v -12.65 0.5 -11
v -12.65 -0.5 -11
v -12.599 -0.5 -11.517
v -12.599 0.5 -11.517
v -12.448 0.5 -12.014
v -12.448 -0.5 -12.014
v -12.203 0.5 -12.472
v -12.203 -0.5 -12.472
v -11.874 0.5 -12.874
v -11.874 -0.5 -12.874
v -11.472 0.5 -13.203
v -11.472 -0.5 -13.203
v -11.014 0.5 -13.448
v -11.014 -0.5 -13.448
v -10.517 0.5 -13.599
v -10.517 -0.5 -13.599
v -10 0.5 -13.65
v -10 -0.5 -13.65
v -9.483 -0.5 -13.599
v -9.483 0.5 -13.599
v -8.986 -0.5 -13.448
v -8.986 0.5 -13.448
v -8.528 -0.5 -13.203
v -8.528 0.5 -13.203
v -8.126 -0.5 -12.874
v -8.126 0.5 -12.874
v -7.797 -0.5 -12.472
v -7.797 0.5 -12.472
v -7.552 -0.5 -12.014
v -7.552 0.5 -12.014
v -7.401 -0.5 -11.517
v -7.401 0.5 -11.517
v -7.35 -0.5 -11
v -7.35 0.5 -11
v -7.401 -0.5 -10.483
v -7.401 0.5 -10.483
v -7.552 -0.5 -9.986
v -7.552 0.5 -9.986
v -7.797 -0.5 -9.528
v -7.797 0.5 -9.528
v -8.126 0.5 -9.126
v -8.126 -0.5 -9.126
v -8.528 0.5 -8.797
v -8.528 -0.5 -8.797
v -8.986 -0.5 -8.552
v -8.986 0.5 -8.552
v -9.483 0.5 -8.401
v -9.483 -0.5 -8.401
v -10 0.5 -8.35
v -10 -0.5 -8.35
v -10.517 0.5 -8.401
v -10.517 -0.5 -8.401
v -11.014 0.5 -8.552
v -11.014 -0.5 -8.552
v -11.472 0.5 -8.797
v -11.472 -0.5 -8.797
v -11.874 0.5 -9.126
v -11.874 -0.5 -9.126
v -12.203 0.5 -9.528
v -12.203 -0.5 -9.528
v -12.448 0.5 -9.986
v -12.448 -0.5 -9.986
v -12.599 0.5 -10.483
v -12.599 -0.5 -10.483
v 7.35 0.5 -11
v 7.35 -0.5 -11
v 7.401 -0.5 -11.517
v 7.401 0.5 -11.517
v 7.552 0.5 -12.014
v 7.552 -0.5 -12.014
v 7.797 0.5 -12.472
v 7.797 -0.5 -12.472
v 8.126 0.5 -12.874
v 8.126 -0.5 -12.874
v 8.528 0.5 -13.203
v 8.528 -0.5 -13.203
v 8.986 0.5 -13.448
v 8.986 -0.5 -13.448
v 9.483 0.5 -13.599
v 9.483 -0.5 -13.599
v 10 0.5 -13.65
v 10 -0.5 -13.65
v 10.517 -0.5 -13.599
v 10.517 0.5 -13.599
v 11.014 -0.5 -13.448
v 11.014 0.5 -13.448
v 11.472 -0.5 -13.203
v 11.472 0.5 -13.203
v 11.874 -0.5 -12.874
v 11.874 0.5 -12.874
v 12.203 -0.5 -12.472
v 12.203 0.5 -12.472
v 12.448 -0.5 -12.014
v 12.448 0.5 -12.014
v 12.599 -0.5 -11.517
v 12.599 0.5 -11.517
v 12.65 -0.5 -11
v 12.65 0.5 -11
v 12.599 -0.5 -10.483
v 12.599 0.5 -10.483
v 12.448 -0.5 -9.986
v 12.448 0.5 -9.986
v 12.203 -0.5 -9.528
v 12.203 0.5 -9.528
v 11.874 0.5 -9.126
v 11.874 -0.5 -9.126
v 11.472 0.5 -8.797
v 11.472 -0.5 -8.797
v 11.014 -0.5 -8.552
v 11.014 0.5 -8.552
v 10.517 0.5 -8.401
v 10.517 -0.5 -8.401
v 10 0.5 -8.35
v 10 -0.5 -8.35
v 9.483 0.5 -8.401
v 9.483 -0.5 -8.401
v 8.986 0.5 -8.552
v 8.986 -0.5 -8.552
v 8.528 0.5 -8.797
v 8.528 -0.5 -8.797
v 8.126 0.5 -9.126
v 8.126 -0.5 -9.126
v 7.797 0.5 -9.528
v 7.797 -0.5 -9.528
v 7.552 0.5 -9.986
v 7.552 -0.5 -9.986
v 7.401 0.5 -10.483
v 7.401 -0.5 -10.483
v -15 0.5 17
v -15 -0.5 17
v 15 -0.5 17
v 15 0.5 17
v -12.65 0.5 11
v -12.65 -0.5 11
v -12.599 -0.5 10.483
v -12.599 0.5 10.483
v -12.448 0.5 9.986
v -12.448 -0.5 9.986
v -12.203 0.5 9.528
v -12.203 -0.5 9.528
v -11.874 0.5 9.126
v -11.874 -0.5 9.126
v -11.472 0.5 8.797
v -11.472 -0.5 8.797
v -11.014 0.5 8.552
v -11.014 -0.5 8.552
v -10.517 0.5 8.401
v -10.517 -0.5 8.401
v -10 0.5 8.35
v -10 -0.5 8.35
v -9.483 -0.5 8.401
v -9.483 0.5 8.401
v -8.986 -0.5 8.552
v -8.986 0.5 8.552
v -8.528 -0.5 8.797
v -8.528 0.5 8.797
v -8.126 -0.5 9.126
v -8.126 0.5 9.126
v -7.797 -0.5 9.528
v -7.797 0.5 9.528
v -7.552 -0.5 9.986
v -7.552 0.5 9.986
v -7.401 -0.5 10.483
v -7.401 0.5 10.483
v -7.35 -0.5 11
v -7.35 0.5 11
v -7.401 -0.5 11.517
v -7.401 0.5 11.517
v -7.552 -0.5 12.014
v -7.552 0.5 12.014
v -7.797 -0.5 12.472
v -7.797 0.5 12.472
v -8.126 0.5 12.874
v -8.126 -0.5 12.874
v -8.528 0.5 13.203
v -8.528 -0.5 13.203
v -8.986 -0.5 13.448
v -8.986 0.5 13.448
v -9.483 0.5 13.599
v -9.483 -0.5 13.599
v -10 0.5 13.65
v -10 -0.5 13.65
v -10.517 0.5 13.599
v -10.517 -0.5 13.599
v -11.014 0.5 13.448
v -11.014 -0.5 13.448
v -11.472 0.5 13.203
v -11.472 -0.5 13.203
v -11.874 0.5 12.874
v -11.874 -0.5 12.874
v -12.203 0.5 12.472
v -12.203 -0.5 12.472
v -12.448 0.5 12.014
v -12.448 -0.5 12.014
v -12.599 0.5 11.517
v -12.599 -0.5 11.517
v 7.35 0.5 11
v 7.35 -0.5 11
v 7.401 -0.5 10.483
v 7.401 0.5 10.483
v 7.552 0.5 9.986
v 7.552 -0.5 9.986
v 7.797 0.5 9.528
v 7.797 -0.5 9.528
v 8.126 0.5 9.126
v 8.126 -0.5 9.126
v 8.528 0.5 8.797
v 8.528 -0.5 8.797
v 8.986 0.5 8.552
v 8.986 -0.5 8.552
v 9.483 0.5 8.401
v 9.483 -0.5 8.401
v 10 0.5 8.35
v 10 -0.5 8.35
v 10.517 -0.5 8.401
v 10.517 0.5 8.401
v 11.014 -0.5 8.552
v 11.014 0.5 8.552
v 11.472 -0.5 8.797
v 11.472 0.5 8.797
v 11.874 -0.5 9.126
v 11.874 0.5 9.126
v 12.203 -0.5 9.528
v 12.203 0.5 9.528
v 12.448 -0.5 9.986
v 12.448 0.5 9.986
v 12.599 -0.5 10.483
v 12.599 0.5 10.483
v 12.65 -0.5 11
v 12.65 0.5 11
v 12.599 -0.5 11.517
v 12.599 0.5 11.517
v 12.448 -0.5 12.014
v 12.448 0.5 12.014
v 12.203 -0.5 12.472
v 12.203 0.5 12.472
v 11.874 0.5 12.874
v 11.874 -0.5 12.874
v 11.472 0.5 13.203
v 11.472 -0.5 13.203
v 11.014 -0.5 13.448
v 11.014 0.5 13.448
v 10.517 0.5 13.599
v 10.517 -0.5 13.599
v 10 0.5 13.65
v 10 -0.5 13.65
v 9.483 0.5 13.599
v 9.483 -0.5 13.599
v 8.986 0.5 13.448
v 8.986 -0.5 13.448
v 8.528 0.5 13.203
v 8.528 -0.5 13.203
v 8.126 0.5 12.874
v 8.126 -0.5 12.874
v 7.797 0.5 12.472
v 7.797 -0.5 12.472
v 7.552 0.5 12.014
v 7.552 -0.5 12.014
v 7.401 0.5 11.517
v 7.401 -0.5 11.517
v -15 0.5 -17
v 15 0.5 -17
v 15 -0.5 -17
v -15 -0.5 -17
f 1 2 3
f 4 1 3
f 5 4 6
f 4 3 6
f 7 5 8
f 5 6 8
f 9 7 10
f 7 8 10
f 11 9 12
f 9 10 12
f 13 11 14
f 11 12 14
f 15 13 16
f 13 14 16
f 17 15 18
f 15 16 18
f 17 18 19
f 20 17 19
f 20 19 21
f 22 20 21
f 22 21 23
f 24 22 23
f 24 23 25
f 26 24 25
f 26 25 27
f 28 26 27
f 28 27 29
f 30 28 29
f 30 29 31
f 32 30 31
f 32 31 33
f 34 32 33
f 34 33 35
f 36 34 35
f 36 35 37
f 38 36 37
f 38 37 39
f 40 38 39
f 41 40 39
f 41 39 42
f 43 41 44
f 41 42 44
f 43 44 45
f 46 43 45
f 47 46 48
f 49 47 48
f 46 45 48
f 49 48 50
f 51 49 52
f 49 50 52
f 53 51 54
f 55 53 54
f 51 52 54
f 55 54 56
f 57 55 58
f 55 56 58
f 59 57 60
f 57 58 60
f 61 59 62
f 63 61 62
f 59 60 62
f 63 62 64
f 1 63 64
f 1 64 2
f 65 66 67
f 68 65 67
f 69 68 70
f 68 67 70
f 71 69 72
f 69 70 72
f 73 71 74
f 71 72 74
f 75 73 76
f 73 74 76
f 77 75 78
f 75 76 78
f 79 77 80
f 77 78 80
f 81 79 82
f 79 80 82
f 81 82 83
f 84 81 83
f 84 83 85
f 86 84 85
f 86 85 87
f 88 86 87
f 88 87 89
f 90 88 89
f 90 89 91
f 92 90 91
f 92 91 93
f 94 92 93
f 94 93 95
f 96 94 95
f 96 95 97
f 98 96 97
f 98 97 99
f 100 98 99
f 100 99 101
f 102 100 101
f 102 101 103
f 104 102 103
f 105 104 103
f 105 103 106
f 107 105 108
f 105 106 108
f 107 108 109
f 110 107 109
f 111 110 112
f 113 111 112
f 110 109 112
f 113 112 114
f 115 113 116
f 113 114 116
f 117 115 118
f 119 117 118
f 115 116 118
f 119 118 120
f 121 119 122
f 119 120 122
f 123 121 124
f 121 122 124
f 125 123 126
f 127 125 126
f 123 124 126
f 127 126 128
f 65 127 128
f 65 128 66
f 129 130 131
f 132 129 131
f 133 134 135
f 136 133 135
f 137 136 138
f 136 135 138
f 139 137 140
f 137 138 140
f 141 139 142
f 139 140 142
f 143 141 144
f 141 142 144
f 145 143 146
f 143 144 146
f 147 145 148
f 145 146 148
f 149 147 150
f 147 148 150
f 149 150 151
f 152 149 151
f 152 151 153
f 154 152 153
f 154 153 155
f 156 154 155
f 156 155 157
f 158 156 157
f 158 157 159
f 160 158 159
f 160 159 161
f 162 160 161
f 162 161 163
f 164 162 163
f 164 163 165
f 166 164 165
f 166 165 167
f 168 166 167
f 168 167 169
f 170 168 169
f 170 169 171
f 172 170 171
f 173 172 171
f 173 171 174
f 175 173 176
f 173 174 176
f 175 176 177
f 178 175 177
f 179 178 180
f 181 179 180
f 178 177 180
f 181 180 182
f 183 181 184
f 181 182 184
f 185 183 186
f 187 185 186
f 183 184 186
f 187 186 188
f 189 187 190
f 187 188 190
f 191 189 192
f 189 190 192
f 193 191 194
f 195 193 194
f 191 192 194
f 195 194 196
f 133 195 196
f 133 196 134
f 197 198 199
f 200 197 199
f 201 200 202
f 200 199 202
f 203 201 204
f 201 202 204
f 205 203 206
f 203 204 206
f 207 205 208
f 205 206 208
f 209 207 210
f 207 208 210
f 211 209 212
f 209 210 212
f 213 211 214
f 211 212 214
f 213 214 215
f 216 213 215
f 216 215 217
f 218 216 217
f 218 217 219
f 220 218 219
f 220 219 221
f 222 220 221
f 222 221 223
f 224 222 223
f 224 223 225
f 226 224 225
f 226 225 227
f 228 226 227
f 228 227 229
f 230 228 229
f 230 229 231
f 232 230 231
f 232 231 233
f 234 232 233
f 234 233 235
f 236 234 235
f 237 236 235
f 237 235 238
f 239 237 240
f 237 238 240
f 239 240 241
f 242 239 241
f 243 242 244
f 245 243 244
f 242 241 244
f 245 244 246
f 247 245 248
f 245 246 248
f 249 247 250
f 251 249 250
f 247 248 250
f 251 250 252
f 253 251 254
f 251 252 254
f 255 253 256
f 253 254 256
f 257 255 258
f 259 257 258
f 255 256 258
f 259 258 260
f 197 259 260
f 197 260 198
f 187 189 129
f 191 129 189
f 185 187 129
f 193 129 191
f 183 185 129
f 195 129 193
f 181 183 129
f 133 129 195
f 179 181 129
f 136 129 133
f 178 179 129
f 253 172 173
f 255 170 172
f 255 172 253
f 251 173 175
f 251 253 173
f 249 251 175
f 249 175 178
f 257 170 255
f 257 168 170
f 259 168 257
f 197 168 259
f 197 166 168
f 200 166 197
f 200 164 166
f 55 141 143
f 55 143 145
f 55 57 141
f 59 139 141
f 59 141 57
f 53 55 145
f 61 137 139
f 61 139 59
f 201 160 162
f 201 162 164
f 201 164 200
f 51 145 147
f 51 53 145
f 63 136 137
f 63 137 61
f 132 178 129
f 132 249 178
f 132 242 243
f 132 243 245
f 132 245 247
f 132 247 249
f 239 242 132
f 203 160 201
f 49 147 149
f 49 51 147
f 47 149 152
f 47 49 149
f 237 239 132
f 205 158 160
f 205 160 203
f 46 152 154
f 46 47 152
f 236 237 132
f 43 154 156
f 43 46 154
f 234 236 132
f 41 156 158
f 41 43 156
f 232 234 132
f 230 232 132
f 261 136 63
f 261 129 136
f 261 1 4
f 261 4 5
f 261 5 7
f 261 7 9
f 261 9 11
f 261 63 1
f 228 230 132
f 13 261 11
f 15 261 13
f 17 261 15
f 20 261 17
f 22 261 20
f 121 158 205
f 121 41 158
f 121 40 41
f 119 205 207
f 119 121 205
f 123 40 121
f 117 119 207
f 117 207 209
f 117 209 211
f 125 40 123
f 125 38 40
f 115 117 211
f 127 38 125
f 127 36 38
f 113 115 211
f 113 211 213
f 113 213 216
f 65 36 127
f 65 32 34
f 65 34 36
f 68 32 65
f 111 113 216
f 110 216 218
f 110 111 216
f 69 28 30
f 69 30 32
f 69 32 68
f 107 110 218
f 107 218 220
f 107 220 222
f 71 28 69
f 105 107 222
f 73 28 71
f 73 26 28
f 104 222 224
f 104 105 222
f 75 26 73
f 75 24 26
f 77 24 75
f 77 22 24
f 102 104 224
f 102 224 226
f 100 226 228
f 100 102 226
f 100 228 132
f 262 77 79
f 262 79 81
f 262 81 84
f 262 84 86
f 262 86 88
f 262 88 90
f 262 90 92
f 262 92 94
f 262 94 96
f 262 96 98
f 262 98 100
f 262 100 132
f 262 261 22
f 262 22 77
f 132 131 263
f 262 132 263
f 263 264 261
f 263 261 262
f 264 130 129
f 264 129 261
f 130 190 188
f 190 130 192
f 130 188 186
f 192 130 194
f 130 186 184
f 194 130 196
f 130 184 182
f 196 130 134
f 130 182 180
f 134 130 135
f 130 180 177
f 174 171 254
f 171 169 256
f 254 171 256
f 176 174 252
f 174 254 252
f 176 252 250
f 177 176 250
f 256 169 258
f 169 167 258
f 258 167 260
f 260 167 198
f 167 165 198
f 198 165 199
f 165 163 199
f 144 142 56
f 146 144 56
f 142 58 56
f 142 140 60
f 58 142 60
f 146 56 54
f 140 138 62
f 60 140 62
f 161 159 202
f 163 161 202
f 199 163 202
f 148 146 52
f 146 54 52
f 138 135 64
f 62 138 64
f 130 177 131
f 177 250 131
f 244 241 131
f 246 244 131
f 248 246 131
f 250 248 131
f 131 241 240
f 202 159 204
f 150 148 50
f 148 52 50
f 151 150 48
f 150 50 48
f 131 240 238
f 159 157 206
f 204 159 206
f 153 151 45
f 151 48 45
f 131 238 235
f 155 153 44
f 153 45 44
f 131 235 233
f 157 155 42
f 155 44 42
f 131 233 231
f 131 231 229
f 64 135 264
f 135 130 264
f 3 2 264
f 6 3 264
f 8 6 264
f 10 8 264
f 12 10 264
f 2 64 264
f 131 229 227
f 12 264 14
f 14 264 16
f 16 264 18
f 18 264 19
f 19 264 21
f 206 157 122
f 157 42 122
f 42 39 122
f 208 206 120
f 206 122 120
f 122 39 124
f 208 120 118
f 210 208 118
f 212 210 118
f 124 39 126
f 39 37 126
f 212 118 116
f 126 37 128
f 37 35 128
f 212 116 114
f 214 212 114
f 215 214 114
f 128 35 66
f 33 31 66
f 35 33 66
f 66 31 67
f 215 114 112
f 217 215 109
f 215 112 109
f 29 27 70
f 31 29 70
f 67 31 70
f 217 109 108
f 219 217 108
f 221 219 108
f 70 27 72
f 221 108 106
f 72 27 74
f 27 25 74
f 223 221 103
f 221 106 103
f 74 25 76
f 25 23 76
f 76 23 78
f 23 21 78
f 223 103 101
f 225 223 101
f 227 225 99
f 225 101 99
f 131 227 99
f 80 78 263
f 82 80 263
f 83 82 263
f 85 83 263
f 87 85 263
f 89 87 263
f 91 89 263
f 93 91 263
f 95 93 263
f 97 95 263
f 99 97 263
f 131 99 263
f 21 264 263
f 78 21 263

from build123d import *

# Parameters (mm, degrees)
BASE_FLANGE1_START     = -0.5
BASE_FLANGE1_OUTLINE_W = 30
BASE_FLANGE1_OUTLINE_H = 34
BASE_FLANGE1_DEPTH     = 1
M5_CLEARANCE_HOLE2_D   = 5.3


# Read off the part's stored shape, not the designer's step: Base-Flange1
with BuildPart() as part:
    # Base-Flange1 outline → Base-Flange1 (new body)
    with BuildSketch(Plane(origin=(0, 0, 0), x_dir=(1, 0, 0), z_dir=(0, 1, 0)).offset(BASE_FLANGE1_START)):
        Rectangle(BASE_FLANGE1_OUTLINE_W, BASE_FLANGE1_OUTLINE_H)
    extrude(amount=BASE_FLANGE1_DEPTH)

    # M5 Clearance Hole2 (through all)
    with Locations(Plane(origin=(0, 0.5, 0), x_dir=(1, 0, 0), z_dir=(0, 1, 0))):
        with Locations((-10, -11), (10, -11), (-10, 11), (10, 11)):
            Hole(M5_CLEARANCE_HOLE2_D / 2)


solid = part.part
